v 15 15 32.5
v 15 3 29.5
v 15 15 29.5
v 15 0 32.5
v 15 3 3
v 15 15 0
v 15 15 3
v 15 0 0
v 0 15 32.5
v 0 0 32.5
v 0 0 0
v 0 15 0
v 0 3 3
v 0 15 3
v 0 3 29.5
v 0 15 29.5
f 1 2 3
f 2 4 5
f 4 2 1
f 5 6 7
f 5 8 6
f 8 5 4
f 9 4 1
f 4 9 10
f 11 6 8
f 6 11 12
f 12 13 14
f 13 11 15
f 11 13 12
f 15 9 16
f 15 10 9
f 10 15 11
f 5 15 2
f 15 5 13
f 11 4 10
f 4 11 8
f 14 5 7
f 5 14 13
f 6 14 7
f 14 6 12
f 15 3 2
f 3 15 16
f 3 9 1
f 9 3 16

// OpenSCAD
module universal_bracket(
        servo_height,
        battery_height,
        tickness,
        bracket_width
    ) {
    base_height = servo_height + battery_height;
    cube([
        bracket_width, tickness, base_height + tickness
    ]);
    cube([bracket_width, bracket_width, tickness]);
    translate([0, 0, base_height]) {
        cube([bracket_width, bracket_width, tickness]);
    } 
}

servo_height = 20;
battery_height = 9.5;
tickness = 3;
bracket_width = 15;

universal_bracket(
    servo_height,
    battery_height,
    tickness,
    bracket_width
);
